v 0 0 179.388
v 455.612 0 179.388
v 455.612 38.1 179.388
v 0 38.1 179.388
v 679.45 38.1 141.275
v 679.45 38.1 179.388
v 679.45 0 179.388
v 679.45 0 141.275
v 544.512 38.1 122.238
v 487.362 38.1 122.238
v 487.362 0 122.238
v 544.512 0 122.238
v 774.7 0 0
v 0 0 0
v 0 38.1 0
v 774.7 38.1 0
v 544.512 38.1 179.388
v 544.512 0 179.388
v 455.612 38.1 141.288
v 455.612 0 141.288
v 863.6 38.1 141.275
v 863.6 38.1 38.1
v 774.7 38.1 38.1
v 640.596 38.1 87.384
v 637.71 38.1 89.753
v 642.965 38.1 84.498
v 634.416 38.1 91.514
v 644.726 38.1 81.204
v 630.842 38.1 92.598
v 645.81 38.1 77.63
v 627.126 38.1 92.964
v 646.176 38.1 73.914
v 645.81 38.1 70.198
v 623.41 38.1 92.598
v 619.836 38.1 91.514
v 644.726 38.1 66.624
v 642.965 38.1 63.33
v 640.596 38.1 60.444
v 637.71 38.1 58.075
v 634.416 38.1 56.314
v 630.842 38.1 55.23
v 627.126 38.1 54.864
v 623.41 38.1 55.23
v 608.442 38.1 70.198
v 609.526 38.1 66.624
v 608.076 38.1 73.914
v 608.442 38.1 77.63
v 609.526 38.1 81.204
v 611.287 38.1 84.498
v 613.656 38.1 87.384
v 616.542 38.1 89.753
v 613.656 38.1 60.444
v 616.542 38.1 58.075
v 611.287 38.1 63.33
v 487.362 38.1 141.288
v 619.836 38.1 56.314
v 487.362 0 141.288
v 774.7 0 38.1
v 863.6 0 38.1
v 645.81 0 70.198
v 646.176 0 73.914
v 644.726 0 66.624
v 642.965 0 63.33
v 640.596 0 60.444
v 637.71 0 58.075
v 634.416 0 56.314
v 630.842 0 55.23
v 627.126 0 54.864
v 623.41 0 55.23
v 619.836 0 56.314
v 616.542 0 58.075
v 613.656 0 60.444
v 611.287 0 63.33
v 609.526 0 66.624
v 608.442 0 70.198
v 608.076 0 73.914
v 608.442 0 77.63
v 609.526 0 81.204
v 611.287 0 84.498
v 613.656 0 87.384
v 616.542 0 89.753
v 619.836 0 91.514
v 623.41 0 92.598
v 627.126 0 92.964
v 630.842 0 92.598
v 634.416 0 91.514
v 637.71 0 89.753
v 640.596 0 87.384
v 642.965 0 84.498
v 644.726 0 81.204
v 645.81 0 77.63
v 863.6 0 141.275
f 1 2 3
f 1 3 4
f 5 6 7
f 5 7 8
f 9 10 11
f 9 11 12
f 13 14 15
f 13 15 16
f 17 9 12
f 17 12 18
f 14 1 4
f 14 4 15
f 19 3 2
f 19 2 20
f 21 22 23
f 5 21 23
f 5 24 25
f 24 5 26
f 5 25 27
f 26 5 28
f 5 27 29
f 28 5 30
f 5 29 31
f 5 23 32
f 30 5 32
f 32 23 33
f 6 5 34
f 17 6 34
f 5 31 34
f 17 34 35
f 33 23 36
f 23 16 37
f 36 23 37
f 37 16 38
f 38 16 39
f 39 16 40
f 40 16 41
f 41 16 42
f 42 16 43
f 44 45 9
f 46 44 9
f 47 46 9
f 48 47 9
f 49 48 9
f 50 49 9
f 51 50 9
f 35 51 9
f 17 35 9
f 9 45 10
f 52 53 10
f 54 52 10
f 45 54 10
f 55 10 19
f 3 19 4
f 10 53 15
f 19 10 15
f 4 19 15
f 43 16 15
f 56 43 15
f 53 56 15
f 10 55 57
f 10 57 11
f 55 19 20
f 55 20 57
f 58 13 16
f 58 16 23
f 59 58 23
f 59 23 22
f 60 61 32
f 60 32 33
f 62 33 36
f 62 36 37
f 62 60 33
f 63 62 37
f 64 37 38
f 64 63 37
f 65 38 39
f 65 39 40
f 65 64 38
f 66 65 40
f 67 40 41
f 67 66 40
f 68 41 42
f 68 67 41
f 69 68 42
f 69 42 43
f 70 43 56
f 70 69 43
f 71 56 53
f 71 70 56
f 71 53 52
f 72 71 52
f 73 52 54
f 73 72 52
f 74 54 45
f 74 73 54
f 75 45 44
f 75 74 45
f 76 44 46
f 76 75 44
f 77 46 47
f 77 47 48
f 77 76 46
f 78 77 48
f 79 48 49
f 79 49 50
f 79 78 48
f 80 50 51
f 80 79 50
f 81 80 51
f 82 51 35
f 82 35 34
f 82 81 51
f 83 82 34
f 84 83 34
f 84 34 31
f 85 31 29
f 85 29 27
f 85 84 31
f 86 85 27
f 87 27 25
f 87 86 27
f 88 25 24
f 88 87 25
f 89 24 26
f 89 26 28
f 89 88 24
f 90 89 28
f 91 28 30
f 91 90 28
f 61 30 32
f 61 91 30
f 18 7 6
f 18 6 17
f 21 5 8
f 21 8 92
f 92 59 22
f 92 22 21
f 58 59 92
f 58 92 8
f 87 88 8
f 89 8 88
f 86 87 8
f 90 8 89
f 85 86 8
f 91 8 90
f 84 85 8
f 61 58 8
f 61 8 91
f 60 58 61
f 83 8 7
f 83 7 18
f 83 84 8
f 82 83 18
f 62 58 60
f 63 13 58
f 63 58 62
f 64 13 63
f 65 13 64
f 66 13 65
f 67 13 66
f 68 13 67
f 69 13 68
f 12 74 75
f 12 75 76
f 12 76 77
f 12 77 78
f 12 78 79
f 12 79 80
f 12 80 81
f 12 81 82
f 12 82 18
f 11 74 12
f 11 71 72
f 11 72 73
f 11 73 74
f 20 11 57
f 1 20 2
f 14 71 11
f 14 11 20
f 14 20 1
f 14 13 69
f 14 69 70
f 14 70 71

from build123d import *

# Parameters (mm, degrees)
SKETCH1_R           = 19.05
BOSS_EXTRUDE1_DEPTH = 38.1
CUT_EXTRUDE5_DEPTH  = 39.1
SKETCH8_W           = 184.15
SKETCH8_H           = 38.1127
CUT_EXTRUDE6_DEPTH  = 39.1


with BuildPart() as part:
    # Sketch1 → Boss-Extrude1 (new body)
    with BuildSketch(Plane(origin=(0, 0, 0), x_dir=(1, 0, 0), z_dir=(0, 1, 0))):
        Polygon((0, 0), (774.7, 0), (774.7, -38.1), (863.6, -38.1), (863.6, -179.3875), (0, -179.3875), align=None)
        with Locations((627.126, -73.914)):
            Circle(SKETCH1_R, mode=Mode.SUBTRACT)
    extrude(amount=BOSS_EXTRUDE1_DEPTH)

    # Sketch7 → Cut-Extrude5 (cut, through all)
    with BuildSketch(Plane(origin=(0, 38.1, 0), x_dir=(1, 0, 0), z_dir=(0, 1, 0))):
        Polygon((455.6125, -141.2875), (487.3625, -141.2875), (487.3625, -122.2375), (544.5125, -122.2375), (544.5125, -179.3875), (455.6125, -179.3875), align=None)
    extrude(amount=-CUT_EXTRUDE5_DEPTH, mode=Mode.SUBTRACT)

    # Sketch8 → Cut-Extrude6 (cut, through all)
    with BuildSketch(Plane(origin=(0, 38.1, 0), x_dir=(1, 0, 0), z_dir=(0, 1, 0))):
        with Locations((771.525, -160.33115)):
            Rectangle(SKETCH8_W, SKETCH8_H)
    extrude(amount=-CUT_EXTRUDE6_DEPTH, mode=Mode.SUBTRACT)


solid = part.part
